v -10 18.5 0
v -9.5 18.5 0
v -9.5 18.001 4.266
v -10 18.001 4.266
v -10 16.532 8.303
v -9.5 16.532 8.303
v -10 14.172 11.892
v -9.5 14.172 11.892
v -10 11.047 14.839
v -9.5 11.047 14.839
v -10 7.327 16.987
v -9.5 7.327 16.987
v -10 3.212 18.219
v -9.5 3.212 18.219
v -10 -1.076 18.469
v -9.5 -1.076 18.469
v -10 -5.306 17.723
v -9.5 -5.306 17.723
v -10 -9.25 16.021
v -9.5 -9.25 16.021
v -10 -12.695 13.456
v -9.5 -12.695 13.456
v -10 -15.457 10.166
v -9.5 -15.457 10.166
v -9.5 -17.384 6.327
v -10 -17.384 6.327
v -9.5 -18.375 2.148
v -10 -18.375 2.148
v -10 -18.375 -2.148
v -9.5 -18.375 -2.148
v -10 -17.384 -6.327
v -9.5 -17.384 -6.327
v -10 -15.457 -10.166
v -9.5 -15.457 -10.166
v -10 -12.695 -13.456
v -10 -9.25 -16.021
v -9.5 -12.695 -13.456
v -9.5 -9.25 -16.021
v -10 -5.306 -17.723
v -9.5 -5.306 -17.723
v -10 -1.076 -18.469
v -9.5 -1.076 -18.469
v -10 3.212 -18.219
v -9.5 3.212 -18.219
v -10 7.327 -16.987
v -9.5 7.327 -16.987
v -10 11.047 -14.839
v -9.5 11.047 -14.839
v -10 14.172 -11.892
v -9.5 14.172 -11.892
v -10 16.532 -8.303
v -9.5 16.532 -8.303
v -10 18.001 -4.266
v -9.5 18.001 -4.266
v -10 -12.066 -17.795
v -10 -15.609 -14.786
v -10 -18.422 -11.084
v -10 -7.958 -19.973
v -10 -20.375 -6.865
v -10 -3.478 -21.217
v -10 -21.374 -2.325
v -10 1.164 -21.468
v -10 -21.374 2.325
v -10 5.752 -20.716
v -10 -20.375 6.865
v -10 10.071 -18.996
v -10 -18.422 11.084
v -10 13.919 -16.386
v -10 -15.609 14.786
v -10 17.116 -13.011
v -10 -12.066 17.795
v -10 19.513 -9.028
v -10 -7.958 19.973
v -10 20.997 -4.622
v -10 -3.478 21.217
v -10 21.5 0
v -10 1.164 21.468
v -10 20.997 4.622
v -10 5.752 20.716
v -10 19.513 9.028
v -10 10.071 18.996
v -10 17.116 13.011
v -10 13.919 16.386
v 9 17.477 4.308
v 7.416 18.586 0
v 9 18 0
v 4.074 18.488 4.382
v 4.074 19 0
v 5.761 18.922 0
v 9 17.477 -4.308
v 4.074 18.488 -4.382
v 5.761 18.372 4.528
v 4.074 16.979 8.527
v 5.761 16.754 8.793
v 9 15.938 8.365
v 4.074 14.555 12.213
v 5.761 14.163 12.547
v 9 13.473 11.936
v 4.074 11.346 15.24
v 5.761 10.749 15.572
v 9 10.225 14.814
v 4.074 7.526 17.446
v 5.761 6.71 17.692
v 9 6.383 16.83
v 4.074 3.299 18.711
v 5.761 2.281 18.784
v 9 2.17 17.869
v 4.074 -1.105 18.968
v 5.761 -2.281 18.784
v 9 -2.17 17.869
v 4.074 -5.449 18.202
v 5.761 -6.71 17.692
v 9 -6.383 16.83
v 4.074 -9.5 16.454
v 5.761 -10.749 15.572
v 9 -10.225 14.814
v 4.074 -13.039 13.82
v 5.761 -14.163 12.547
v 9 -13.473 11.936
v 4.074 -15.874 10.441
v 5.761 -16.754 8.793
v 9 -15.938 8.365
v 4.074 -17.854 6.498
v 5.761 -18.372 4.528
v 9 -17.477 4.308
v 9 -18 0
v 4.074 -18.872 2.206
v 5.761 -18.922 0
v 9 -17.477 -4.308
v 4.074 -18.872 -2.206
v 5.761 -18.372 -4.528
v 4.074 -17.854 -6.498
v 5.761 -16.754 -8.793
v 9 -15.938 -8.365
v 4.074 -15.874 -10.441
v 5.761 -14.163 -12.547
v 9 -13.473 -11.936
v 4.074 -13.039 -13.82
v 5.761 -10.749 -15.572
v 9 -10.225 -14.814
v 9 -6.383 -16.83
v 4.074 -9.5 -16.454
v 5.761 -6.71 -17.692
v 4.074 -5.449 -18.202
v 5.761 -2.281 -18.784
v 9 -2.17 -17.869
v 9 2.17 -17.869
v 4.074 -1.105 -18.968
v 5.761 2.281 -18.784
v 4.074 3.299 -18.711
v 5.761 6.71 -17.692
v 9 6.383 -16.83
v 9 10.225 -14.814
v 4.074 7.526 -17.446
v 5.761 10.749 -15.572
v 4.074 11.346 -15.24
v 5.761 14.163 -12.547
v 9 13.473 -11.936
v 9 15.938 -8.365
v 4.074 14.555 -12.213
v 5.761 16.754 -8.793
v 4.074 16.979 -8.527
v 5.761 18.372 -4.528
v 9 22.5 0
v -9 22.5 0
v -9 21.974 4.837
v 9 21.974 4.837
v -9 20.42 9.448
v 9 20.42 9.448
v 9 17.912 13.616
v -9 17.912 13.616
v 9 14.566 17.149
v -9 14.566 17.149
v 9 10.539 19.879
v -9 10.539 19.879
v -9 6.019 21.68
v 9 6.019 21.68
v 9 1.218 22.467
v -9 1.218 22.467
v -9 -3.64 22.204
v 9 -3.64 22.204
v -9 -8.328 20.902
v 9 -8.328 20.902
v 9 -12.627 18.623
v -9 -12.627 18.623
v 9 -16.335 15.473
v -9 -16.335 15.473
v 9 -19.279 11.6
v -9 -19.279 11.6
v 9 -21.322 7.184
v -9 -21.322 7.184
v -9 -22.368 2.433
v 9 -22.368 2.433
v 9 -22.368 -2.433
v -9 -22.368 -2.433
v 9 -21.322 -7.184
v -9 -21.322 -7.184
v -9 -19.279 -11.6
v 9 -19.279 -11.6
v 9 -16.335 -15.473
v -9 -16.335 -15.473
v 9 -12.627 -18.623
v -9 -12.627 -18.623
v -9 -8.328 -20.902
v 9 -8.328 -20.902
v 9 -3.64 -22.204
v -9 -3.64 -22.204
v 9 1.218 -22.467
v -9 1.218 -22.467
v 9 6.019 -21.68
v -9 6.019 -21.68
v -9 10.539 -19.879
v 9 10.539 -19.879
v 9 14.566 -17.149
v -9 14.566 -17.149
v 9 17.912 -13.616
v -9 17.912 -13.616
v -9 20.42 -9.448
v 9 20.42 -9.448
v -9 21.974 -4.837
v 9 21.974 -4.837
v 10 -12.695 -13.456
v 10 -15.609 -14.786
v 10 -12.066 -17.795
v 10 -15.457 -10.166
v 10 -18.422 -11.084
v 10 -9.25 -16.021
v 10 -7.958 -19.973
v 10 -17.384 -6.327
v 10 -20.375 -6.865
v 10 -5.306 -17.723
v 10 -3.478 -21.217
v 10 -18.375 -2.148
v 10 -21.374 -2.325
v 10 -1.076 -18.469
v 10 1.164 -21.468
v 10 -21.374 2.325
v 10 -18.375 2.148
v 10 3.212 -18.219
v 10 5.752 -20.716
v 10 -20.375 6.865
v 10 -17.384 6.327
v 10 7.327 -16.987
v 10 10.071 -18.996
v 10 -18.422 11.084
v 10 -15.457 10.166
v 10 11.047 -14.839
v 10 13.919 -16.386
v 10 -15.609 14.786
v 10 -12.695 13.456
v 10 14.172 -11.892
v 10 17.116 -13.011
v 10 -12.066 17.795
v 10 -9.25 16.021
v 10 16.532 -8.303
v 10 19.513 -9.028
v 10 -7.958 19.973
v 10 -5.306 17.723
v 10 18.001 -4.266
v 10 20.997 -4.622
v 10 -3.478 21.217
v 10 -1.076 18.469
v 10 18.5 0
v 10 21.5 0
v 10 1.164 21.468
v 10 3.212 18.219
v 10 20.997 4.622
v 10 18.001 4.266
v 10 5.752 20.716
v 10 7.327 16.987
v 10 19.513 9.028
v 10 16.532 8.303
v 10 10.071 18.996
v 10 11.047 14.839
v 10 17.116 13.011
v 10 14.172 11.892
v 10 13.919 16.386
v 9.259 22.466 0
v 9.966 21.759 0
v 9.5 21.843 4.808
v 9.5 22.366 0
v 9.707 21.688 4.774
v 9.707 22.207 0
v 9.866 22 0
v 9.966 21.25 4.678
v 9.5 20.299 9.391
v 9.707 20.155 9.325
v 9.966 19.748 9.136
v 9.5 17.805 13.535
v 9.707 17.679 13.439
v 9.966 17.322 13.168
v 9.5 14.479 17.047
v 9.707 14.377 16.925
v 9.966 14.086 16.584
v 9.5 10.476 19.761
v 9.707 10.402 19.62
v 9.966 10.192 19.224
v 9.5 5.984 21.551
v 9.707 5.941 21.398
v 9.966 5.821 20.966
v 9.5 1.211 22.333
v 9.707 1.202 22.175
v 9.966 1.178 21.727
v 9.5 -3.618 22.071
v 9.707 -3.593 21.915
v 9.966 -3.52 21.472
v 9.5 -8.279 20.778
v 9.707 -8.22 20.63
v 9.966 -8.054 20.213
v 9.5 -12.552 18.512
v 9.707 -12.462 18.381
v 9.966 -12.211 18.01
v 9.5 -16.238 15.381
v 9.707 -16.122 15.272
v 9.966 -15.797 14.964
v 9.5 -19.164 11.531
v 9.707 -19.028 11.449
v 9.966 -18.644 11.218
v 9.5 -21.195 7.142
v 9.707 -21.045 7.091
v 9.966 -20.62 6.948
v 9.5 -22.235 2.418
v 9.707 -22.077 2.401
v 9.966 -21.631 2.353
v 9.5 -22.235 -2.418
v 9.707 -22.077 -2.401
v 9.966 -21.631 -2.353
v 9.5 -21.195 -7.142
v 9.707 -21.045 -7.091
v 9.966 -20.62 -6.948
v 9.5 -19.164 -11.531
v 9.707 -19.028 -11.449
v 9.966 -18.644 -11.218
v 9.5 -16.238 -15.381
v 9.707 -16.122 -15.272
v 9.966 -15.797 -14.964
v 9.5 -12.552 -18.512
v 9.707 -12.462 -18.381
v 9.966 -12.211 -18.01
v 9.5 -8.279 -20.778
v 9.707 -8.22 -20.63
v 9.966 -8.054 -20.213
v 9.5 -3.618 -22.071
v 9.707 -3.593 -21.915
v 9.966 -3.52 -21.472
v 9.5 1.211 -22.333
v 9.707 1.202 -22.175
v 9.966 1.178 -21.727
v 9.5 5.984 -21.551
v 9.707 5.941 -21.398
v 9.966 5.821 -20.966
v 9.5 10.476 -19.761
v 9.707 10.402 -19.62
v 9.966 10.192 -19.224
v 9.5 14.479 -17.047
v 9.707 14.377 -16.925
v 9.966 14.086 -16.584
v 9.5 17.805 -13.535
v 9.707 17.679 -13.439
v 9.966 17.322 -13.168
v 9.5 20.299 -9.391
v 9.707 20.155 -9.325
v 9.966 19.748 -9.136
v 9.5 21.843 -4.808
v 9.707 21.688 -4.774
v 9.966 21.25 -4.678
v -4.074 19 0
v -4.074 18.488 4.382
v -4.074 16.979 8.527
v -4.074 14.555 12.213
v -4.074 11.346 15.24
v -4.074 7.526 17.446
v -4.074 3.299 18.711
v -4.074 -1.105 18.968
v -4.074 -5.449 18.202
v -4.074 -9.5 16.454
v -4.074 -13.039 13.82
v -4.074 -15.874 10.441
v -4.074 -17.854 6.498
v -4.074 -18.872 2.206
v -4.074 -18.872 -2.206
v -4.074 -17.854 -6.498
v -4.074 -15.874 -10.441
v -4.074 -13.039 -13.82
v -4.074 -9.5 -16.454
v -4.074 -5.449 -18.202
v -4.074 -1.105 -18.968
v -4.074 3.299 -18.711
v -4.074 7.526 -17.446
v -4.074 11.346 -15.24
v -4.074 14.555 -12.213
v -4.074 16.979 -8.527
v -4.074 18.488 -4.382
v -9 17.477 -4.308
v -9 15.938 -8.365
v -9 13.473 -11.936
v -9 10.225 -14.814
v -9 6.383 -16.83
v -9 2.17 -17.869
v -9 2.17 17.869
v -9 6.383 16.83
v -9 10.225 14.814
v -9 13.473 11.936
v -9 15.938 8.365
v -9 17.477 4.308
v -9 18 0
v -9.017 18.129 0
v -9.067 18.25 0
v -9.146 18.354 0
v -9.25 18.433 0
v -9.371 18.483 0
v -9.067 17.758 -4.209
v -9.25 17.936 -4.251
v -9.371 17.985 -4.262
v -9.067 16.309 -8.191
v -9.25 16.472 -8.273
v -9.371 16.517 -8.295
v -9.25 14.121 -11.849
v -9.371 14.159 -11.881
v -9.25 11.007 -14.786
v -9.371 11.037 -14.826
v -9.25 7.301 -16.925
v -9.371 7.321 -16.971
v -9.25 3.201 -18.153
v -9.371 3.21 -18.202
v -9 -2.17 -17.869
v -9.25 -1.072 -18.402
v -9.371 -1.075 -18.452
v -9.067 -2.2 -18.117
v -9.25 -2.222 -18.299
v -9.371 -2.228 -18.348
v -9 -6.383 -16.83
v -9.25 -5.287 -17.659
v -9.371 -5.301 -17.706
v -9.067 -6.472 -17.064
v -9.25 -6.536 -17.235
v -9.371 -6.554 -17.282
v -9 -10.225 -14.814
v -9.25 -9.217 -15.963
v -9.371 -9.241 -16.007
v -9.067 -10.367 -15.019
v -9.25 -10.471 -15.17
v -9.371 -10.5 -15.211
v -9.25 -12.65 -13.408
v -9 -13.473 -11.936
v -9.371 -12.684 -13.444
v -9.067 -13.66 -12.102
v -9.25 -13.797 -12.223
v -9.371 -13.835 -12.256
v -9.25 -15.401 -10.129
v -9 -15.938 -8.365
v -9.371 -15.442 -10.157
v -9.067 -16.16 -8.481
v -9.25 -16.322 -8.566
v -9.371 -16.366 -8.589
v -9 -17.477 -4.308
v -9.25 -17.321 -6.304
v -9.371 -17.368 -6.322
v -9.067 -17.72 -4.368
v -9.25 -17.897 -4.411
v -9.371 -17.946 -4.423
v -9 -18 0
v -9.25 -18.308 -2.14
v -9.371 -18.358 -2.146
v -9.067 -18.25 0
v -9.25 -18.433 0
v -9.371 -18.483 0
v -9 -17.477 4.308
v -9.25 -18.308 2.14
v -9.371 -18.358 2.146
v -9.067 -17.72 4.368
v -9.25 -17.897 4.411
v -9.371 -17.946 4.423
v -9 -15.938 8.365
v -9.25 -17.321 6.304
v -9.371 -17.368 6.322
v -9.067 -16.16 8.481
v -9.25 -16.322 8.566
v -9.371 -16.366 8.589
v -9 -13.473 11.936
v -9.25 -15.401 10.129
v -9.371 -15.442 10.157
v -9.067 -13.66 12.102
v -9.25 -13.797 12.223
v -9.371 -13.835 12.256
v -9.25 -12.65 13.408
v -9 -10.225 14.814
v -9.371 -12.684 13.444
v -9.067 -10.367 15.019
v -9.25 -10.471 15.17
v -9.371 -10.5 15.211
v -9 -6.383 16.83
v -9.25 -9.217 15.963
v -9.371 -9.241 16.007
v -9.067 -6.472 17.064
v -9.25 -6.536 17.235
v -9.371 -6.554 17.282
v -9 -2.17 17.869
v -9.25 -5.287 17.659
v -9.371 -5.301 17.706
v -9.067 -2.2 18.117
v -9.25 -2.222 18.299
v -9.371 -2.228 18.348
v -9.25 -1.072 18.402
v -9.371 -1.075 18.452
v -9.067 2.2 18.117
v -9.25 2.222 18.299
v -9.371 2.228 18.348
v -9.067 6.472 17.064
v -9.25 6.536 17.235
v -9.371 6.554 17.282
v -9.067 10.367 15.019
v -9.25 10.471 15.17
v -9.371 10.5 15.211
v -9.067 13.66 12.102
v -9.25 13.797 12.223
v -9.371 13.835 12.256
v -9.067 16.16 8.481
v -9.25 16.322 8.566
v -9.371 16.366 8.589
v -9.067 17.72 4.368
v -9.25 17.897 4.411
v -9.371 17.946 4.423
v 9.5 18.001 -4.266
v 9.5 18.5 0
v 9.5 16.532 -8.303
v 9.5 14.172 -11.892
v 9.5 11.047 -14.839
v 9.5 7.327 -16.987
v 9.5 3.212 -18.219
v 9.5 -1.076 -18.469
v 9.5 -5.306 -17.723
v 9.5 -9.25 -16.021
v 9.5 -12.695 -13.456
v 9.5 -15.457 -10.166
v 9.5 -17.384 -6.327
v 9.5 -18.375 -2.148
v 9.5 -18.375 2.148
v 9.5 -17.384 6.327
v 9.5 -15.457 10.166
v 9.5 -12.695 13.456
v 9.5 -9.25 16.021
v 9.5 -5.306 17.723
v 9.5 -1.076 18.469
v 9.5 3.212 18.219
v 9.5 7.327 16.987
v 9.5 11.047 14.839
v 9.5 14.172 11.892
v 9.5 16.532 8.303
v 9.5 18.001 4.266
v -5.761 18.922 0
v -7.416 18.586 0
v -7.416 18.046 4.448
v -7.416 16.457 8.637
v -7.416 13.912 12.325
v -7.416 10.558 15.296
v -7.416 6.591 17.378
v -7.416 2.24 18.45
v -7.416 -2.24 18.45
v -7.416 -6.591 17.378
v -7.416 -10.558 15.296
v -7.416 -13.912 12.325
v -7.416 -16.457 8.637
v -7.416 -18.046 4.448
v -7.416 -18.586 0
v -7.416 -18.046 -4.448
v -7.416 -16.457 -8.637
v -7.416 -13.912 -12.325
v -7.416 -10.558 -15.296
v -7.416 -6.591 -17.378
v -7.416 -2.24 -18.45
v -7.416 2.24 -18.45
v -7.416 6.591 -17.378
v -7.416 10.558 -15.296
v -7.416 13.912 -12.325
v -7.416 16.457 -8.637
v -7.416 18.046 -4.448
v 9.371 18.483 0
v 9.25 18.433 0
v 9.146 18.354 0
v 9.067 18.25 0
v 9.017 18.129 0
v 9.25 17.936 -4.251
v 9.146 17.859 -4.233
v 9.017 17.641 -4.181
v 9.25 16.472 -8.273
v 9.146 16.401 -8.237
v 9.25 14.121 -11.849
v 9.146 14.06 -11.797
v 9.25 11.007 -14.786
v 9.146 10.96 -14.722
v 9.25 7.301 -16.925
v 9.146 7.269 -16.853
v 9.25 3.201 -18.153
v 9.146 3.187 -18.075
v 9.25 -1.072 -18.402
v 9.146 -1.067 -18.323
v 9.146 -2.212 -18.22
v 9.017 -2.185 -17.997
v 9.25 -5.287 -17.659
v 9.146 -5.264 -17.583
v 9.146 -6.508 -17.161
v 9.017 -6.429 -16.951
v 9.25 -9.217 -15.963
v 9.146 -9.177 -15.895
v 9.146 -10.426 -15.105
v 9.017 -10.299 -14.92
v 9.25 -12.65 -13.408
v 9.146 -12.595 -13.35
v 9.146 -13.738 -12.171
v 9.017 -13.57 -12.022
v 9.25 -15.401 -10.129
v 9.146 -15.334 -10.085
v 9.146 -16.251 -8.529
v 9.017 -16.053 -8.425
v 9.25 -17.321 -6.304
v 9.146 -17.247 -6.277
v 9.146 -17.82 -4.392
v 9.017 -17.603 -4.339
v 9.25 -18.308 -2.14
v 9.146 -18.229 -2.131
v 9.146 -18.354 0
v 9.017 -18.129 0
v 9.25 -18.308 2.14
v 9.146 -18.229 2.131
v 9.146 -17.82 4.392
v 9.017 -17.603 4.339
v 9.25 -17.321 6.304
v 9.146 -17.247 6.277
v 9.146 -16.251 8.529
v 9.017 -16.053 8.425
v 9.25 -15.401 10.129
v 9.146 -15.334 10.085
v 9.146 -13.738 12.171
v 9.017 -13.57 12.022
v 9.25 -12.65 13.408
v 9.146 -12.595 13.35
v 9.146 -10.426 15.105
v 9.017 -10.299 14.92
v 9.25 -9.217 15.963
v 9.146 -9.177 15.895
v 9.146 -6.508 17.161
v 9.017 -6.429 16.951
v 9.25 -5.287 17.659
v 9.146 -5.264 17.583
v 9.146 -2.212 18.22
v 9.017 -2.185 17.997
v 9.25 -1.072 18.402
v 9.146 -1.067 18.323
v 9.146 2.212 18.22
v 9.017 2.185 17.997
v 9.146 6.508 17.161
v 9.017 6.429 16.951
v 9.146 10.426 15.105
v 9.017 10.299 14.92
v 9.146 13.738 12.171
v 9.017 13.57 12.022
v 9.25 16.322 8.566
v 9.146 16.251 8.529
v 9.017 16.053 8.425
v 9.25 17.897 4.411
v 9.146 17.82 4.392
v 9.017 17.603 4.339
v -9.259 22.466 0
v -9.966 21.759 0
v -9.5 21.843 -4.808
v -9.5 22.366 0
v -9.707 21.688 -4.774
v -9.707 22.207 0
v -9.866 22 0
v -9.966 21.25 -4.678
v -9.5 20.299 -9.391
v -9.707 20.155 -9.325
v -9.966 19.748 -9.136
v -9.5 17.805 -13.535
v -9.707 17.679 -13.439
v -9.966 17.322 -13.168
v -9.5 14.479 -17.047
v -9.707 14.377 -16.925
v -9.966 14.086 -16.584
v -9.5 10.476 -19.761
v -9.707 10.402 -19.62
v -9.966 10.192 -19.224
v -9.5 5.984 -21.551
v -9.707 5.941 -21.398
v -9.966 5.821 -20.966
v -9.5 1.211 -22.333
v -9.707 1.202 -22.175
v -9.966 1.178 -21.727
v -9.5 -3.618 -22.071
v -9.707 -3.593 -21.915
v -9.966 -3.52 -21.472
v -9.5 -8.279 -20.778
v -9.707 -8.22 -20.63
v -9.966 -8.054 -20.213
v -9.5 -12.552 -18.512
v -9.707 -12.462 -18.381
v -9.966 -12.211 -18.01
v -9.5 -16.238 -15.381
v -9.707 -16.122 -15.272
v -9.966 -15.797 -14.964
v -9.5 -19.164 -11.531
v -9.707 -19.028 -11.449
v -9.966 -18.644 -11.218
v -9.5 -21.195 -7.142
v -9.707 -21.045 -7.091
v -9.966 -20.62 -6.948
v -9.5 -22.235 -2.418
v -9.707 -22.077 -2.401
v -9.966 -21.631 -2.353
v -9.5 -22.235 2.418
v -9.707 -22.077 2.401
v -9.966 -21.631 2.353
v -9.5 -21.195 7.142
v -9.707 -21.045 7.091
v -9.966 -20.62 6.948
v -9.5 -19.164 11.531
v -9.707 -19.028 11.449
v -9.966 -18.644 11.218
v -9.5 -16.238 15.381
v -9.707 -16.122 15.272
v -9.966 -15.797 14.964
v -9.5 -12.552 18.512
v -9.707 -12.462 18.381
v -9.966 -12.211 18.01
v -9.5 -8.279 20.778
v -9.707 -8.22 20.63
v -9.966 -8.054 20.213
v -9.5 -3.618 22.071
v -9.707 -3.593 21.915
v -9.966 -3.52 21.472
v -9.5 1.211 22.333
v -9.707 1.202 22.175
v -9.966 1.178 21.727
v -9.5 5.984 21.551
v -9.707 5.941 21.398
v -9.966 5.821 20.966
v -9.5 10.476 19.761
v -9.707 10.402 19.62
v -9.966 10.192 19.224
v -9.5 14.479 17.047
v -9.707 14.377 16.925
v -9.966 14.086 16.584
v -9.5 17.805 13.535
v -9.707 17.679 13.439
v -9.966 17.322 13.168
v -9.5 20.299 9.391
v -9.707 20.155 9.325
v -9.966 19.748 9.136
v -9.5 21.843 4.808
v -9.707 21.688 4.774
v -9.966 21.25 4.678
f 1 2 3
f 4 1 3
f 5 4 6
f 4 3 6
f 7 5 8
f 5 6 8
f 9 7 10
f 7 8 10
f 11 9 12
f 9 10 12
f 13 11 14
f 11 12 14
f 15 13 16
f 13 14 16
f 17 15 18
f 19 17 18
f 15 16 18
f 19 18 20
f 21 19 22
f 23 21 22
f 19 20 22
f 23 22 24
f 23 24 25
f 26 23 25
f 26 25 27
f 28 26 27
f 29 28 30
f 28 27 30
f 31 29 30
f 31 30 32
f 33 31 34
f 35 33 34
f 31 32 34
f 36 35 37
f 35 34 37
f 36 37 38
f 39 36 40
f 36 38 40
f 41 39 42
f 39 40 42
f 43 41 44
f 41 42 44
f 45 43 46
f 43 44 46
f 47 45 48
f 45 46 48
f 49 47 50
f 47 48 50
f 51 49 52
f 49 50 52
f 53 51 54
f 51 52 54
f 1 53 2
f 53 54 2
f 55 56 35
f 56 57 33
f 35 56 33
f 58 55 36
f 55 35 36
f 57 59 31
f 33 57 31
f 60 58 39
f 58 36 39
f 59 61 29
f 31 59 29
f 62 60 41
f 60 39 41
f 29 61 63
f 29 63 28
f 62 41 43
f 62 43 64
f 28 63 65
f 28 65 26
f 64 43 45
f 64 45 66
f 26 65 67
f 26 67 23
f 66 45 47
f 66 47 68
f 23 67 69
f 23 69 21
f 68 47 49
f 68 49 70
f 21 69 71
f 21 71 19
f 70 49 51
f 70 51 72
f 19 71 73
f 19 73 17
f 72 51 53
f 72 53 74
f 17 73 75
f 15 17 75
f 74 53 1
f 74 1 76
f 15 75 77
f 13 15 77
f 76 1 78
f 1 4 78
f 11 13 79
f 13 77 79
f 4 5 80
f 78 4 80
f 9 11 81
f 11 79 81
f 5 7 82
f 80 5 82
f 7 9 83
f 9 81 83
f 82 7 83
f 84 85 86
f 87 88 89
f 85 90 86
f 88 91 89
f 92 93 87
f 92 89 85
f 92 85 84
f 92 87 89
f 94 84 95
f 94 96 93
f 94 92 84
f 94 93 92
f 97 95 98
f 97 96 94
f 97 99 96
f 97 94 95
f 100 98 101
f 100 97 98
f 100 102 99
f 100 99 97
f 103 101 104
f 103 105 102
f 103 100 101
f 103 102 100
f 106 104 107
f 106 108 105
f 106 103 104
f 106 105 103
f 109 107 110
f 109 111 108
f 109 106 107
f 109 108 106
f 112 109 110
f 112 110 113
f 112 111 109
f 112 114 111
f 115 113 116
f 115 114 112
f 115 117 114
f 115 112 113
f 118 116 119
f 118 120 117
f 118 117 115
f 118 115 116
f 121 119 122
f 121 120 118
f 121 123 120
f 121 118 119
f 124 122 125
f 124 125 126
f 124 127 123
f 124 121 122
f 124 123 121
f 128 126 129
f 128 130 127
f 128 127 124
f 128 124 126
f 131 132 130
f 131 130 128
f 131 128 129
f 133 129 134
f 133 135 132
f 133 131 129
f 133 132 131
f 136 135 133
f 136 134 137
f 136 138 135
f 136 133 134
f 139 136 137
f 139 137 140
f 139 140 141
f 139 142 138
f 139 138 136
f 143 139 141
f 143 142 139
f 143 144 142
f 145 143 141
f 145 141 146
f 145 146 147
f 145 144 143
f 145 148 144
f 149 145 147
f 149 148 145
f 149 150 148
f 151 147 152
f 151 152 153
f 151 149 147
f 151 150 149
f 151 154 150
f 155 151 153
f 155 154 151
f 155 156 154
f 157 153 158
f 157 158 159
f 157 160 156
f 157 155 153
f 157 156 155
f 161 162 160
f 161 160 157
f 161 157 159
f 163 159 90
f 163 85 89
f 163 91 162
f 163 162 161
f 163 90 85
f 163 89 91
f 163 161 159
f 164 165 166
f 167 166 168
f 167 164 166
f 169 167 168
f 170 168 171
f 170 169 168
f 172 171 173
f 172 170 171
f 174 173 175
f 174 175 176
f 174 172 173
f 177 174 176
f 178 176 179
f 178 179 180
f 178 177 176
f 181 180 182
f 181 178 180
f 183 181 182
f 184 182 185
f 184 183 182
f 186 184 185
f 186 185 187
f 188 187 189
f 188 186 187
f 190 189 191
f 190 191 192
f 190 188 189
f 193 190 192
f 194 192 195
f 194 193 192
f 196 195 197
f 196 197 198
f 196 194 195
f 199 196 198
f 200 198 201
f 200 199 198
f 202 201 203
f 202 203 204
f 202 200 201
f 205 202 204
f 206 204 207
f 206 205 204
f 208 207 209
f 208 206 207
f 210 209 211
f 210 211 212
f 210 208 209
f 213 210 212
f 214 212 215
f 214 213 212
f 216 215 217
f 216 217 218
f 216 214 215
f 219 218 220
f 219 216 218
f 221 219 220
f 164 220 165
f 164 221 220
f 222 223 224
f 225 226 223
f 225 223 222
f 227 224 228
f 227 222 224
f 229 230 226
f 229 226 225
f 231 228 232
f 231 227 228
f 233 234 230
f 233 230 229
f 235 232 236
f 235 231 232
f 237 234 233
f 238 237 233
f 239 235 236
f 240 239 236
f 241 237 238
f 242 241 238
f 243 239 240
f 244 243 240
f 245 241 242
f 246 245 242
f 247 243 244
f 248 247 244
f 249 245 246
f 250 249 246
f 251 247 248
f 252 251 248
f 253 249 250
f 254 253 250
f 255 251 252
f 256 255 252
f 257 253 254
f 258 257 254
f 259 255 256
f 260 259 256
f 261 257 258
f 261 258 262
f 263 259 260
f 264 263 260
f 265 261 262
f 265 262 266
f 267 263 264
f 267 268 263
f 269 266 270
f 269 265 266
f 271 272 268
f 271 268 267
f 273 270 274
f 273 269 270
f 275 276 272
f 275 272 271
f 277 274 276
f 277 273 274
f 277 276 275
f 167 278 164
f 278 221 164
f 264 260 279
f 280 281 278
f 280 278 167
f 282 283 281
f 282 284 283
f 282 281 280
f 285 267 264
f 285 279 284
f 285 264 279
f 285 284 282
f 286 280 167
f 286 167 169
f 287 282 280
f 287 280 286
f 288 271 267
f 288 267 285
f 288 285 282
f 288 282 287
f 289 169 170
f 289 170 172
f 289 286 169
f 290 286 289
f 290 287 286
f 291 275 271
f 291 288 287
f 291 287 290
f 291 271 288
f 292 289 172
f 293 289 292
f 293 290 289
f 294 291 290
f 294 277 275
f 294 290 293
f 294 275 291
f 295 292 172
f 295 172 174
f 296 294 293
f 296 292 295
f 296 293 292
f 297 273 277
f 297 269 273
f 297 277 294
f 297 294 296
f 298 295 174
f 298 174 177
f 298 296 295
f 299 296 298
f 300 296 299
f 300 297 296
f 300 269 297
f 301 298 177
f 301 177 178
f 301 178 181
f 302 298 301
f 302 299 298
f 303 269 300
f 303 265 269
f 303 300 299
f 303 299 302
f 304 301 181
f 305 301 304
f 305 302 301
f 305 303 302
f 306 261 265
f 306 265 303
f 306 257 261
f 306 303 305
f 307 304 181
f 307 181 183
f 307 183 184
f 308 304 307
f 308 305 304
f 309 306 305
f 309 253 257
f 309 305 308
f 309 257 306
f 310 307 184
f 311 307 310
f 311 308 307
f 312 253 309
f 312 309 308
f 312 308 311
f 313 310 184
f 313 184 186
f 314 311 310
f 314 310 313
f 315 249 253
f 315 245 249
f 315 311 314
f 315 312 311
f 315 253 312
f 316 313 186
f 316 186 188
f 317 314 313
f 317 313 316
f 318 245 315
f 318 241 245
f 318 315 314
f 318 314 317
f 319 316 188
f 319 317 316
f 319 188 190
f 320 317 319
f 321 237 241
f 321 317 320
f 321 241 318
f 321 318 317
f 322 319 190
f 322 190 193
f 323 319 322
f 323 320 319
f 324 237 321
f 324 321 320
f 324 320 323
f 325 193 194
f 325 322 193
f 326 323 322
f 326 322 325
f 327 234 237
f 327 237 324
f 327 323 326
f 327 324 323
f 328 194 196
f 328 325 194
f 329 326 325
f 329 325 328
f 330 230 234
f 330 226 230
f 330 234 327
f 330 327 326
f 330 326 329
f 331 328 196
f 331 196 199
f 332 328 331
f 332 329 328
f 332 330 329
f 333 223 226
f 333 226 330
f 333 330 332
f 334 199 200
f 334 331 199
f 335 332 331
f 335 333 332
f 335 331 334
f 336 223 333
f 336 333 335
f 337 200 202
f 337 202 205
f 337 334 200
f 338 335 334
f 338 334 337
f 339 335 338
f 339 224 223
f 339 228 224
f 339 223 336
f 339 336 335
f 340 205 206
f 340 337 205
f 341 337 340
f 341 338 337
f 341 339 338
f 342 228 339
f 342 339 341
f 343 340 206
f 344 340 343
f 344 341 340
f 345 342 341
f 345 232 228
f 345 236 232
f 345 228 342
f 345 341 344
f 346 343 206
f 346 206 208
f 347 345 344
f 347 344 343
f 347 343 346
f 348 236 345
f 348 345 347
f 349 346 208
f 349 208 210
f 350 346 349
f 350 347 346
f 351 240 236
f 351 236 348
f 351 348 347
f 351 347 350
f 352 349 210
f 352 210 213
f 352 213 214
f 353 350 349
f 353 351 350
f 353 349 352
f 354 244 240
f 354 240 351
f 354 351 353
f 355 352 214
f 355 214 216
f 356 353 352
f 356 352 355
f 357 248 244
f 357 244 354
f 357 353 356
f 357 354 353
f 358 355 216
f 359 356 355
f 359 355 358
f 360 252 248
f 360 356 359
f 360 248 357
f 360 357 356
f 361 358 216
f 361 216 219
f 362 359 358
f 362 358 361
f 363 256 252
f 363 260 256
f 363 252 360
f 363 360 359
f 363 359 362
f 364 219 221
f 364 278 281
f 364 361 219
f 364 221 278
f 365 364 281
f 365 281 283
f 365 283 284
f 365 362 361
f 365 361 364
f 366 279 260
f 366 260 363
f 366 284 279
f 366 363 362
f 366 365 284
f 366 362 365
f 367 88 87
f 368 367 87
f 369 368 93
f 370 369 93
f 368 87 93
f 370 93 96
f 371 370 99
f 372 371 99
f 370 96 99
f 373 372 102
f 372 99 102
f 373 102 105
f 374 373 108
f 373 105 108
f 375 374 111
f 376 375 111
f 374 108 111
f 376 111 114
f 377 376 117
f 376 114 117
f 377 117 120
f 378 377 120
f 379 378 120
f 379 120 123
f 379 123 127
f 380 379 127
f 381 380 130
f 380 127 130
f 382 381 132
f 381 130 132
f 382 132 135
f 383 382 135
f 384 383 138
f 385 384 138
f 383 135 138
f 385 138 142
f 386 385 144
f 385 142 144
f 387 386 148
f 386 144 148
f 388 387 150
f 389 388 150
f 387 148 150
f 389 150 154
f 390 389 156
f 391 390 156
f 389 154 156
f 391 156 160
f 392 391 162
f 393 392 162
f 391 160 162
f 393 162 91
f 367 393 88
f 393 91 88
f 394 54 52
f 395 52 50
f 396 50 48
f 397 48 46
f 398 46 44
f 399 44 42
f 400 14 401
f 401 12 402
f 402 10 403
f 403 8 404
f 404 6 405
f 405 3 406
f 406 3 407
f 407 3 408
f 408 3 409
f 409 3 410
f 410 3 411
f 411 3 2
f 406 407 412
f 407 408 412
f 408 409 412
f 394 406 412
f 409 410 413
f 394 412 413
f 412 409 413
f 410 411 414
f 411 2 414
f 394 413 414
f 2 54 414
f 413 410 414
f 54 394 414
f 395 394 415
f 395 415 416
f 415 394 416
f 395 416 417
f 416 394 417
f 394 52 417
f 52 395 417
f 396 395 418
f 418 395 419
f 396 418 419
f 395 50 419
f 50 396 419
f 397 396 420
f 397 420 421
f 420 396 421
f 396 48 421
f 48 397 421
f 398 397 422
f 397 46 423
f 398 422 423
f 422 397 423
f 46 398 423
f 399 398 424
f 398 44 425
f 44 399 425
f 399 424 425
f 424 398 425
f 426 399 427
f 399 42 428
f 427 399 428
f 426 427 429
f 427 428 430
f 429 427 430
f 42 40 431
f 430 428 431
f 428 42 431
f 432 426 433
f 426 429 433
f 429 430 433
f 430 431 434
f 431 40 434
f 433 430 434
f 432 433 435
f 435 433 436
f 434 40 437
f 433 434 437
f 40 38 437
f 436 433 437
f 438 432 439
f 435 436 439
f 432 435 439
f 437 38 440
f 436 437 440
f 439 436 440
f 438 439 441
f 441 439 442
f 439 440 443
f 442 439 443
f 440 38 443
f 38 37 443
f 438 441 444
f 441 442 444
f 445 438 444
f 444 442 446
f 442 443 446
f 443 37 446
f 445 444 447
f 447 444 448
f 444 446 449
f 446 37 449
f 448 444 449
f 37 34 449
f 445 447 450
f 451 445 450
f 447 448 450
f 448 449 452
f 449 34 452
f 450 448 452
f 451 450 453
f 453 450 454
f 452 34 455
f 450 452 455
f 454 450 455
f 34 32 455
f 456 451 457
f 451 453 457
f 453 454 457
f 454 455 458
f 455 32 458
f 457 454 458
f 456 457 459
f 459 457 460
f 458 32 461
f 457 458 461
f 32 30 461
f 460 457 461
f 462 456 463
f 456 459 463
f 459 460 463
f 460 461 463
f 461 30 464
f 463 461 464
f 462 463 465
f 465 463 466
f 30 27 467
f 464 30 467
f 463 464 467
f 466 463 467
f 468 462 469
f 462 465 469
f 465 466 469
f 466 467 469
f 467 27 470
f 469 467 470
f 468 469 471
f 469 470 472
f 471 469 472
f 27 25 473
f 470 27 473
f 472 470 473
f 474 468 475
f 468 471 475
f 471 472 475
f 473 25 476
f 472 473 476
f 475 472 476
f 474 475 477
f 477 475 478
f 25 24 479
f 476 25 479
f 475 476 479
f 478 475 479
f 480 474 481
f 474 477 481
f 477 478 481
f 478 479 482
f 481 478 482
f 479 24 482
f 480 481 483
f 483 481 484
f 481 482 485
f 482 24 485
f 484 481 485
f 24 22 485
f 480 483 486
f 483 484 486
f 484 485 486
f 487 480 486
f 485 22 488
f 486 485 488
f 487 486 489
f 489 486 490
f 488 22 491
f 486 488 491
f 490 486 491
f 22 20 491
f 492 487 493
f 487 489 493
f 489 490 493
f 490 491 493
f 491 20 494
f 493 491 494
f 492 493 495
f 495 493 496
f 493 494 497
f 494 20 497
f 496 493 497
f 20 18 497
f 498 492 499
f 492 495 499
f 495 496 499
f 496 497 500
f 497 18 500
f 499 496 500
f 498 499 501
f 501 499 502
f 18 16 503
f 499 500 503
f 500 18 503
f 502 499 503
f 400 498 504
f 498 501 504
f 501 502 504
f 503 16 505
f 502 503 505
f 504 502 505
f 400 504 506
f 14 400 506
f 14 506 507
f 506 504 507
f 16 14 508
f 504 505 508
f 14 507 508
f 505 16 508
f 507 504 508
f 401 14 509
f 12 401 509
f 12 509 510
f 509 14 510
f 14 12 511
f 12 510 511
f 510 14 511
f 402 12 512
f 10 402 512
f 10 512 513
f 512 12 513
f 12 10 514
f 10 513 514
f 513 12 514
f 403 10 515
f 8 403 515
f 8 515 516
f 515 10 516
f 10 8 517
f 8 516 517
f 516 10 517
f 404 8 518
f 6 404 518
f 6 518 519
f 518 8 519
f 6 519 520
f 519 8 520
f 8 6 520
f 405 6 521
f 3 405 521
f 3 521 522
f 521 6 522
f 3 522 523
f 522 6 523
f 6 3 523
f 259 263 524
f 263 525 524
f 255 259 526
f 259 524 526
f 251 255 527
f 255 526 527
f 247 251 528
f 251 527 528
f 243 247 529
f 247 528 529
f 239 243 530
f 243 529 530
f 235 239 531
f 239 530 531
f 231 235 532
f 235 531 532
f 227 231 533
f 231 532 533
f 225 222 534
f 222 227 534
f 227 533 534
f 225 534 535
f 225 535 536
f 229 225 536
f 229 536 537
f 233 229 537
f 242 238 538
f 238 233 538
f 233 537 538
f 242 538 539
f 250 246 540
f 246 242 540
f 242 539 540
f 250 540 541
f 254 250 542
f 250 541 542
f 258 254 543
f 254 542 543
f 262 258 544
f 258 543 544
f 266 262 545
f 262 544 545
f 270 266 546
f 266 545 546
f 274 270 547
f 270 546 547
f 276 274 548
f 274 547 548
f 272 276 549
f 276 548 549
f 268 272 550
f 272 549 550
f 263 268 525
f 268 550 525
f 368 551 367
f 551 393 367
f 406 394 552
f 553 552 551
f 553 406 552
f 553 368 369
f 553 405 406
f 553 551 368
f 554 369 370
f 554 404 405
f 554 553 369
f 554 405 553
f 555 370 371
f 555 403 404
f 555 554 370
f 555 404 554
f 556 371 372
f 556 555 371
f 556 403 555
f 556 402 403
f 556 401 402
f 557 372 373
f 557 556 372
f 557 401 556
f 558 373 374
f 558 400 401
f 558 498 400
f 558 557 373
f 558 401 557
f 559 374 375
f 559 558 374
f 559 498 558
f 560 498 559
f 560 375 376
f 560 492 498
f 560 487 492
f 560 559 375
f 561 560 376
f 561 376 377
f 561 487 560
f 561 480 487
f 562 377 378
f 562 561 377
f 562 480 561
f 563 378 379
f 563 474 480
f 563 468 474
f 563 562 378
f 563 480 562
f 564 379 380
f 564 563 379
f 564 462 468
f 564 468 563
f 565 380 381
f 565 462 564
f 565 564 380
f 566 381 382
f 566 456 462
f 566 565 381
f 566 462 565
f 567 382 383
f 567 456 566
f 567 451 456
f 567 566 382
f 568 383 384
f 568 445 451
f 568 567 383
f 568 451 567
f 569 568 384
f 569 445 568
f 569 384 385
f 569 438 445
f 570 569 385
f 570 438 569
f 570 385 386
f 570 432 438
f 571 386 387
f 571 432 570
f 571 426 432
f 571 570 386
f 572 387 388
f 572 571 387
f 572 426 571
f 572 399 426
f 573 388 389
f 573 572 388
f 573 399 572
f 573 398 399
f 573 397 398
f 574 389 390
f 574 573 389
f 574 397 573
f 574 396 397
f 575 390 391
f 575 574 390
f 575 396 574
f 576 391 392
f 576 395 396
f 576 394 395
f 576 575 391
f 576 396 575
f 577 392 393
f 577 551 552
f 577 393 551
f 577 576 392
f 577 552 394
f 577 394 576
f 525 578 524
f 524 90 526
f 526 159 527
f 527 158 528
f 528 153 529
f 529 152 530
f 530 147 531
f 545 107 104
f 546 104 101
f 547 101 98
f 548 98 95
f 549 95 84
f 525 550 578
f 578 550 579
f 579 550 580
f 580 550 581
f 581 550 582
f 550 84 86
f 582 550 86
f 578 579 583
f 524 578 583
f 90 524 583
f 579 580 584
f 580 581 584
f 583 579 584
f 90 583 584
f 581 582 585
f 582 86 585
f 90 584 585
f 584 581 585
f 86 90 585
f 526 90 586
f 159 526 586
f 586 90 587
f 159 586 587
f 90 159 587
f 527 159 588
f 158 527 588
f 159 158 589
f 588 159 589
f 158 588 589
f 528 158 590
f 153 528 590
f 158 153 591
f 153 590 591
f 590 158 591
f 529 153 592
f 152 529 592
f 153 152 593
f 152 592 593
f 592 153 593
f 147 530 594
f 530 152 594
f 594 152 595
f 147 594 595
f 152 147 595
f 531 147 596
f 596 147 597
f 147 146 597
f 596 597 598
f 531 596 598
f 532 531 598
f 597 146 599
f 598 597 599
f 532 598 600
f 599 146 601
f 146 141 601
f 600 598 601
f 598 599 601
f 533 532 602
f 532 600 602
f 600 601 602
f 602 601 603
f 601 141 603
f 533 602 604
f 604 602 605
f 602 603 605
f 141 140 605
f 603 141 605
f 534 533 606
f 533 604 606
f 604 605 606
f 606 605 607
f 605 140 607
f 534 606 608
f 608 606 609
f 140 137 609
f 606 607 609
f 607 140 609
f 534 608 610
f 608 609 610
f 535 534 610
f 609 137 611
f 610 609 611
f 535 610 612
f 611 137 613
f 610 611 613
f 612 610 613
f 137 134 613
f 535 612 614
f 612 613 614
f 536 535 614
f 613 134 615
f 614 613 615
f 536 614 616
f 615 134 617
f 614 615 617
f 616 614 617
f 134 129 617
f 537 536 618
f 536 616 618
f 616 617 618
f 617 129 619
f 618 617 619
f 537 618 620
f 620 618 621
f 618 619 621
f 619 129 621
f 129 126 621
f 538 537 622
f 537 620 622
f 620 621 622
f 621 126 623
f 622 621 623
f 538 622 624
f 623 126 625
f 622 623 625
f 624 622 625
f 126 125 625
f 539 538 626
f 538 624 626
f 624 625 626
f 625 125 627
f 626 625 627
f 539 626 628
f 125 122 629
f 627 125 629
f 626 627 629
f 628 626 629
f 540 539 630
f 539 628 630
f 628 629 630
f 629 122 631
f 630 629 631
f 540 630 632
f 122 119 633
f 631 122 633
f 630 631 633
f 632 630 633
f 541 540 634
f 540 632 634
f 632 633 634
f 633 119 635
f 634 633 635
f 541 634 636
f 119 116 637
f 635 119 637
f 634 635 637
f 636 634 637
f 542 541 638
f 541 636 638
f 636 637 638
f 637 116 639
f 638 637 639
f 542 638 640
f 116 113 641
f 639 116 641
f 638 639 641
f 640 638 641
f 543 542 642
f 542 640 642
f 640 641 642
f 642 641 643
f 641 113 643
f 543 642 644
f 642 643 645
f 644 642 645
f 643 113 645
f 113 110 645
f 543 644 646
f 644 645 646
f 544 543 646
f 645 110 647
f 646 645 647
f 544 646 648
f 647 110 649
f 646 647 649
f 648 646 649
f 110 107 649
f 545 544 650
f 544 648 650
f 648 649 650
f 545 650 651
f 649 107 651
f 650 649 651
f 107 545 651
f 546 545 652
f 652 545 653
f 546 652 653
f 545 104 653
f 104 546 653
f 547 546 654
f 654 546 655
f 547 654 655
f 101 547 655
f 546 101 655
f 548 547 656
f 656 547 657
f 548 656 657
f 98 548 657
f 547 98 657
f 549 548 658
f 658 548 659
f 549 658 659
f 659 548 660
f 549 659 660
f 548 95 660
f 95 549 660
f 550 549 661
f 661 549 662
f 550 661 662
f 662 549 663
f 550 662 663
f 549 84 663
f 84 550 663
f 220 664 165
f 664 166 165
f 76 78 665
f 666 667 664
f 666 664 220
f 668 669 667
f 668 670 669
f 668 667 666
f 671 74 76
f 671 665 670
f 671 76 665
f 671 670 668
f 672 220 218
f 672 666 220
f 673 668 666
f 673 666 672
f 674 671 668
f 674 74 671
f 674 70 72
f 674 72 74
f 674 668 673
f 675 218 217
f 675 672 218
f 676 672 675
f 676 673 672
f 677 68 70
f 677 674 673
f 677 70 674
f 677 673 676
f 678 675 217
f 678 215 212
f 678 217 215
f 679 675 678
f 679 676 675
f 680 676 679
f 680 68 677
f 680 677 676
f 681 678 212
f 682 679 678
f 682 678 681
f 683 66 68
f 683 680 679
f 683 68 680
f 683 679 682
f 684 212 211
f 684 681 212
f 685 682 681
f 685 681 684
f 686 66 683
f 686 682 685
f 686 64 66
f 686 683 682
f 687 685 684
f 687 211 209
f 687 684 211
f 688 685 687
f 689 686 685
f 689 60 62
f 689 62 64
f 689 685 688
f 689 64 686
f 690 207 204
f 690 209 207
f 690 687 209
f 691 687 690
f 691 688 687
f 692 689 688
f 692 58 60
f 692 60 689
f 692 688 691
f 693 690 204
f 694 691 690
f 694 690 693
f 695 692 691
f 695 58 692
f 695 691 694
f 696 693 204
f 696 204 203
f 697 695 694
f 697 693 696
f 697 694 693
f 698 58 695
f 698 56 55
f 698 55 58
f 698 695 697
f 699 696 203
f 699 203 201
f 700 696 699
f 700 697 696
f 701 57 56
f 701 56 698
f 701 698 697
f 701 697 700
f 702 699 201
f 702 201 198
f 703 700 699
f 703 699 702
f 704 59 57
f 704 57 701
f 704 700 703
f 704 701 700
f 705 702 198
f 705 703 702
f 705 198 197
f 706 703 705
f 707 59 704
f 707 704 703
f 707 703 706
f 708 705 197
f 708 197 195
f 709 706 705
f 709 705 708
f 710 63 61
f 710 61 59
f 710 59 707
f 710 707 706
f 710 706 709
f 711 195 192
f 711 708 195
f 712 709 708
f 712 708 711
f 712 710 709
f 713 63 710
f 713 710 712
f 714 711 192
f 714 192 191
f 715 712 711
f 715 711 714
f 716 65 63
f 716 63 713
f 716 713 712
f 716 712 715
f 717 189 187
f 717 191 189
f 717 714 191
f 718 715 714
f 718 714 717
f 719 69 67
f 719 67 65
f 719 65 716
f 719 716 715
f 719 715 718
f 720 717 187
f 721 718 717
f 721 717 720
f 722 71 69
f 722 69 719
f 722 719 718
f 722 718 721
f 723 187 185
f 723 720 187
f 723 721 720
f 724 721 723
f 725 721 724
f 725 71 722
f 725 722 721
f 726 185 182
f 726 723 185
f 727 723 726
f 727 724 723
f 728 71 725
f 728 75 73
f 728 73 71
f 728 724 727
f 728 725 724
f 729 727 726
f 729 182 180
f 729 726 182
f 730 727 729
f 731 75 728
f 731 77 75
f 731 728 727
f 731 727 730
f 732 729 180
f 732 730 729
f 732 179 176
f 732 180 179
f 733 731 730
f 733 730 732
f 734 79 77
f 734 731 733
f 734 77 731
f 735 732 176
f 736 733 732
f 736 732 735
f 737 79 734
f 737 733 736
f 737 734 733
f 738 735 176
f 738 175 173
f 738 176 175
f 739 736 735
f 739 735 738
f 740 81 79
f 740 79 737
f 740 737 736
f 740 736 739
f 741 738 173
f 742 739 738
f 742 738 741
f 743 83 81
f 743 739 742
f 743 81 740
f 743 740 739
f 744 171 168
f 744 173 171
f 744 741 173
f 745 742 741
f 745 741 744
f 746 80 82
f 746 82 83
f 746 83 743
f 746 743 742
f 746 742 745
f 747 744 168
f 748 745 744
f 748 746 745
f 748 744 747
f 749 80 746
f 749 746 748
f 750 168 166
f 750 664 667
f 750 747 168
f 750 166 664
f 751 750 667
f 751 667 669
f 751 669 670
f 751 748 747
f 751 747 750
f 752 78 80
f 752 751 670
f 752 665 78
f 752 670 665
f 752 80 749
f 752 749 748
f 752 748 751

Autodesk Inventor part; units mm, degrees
ref_plane "YZ Plane" through (0, 0, 0) normal (1, 0, 0) x (0, 1, 0)
ref_plane "XZ Plane" through (0, 0, 0) normal (0, 1, 0) x (-1, 0, 0)
ref_plane "XY Plane" through (0, 0, 0) normal (0, 0, 1) x (1, 0, 0)
sketch "草图1" plane through (0, 0, 0) normal (0, 0, 1) x (1, 0, 0)
  line L0 (-10, 22.5) -> (10, 22.5)
  line L1 (-14, 0) -> (14, 0) projected
  line L2 (0, -4.5) -> (0, 27) projected
  line L3 (-10, 22.5) -> (-10, 18.5)
  line L4 (-10, 18.5) -> (-9.5, 18.5)
  arc A0 (-9, 18) -> (-9.5, 18.5) centre (-9.5, 18) ccw
  line L5 (-9.5, 18) -> (-7.8897, 18) construction
  arc A1 (-4.0742, 19) -> (-9, 18) centre (-4.4094, 8.0196) ccw
  line L6 (10, 22.5) -> (10, 18.5)
  line L7 (10, 18.5) -> (9.5, 18.5)
  arc A2 (9.5, 18.5) -> (9, 18) centre (9.5, 18) ccw
  arc A3 (9, 18) -> (4.0742, 19) centre (4.4094, 8.0196) ccw
  line L8 (-4.0742, 19) -> (4.0742, 19)
  point P0 (0, 0)
  dimension "d0" = 20
  dimension "d1" = 0.5
  dimension "d2" = 4
  dimension "d3" = 1
  dimension "d4" = 22.5
  dimension "d5" = 18
  dimension "d6" = 19
  dimension "d7" = 10.9856
  dimension "d8" = 8.1484
revolve "旋转1" add sketch "草图1" angle 360 about axis through (-10, 0, 0) along (1, 0, 0)
fillet "圆角1" radius 1 2 edges at (-10, -22.5, 0) (10, -22.5, 0)
properties part number "橡胶外轮设计" material "橡胶"
